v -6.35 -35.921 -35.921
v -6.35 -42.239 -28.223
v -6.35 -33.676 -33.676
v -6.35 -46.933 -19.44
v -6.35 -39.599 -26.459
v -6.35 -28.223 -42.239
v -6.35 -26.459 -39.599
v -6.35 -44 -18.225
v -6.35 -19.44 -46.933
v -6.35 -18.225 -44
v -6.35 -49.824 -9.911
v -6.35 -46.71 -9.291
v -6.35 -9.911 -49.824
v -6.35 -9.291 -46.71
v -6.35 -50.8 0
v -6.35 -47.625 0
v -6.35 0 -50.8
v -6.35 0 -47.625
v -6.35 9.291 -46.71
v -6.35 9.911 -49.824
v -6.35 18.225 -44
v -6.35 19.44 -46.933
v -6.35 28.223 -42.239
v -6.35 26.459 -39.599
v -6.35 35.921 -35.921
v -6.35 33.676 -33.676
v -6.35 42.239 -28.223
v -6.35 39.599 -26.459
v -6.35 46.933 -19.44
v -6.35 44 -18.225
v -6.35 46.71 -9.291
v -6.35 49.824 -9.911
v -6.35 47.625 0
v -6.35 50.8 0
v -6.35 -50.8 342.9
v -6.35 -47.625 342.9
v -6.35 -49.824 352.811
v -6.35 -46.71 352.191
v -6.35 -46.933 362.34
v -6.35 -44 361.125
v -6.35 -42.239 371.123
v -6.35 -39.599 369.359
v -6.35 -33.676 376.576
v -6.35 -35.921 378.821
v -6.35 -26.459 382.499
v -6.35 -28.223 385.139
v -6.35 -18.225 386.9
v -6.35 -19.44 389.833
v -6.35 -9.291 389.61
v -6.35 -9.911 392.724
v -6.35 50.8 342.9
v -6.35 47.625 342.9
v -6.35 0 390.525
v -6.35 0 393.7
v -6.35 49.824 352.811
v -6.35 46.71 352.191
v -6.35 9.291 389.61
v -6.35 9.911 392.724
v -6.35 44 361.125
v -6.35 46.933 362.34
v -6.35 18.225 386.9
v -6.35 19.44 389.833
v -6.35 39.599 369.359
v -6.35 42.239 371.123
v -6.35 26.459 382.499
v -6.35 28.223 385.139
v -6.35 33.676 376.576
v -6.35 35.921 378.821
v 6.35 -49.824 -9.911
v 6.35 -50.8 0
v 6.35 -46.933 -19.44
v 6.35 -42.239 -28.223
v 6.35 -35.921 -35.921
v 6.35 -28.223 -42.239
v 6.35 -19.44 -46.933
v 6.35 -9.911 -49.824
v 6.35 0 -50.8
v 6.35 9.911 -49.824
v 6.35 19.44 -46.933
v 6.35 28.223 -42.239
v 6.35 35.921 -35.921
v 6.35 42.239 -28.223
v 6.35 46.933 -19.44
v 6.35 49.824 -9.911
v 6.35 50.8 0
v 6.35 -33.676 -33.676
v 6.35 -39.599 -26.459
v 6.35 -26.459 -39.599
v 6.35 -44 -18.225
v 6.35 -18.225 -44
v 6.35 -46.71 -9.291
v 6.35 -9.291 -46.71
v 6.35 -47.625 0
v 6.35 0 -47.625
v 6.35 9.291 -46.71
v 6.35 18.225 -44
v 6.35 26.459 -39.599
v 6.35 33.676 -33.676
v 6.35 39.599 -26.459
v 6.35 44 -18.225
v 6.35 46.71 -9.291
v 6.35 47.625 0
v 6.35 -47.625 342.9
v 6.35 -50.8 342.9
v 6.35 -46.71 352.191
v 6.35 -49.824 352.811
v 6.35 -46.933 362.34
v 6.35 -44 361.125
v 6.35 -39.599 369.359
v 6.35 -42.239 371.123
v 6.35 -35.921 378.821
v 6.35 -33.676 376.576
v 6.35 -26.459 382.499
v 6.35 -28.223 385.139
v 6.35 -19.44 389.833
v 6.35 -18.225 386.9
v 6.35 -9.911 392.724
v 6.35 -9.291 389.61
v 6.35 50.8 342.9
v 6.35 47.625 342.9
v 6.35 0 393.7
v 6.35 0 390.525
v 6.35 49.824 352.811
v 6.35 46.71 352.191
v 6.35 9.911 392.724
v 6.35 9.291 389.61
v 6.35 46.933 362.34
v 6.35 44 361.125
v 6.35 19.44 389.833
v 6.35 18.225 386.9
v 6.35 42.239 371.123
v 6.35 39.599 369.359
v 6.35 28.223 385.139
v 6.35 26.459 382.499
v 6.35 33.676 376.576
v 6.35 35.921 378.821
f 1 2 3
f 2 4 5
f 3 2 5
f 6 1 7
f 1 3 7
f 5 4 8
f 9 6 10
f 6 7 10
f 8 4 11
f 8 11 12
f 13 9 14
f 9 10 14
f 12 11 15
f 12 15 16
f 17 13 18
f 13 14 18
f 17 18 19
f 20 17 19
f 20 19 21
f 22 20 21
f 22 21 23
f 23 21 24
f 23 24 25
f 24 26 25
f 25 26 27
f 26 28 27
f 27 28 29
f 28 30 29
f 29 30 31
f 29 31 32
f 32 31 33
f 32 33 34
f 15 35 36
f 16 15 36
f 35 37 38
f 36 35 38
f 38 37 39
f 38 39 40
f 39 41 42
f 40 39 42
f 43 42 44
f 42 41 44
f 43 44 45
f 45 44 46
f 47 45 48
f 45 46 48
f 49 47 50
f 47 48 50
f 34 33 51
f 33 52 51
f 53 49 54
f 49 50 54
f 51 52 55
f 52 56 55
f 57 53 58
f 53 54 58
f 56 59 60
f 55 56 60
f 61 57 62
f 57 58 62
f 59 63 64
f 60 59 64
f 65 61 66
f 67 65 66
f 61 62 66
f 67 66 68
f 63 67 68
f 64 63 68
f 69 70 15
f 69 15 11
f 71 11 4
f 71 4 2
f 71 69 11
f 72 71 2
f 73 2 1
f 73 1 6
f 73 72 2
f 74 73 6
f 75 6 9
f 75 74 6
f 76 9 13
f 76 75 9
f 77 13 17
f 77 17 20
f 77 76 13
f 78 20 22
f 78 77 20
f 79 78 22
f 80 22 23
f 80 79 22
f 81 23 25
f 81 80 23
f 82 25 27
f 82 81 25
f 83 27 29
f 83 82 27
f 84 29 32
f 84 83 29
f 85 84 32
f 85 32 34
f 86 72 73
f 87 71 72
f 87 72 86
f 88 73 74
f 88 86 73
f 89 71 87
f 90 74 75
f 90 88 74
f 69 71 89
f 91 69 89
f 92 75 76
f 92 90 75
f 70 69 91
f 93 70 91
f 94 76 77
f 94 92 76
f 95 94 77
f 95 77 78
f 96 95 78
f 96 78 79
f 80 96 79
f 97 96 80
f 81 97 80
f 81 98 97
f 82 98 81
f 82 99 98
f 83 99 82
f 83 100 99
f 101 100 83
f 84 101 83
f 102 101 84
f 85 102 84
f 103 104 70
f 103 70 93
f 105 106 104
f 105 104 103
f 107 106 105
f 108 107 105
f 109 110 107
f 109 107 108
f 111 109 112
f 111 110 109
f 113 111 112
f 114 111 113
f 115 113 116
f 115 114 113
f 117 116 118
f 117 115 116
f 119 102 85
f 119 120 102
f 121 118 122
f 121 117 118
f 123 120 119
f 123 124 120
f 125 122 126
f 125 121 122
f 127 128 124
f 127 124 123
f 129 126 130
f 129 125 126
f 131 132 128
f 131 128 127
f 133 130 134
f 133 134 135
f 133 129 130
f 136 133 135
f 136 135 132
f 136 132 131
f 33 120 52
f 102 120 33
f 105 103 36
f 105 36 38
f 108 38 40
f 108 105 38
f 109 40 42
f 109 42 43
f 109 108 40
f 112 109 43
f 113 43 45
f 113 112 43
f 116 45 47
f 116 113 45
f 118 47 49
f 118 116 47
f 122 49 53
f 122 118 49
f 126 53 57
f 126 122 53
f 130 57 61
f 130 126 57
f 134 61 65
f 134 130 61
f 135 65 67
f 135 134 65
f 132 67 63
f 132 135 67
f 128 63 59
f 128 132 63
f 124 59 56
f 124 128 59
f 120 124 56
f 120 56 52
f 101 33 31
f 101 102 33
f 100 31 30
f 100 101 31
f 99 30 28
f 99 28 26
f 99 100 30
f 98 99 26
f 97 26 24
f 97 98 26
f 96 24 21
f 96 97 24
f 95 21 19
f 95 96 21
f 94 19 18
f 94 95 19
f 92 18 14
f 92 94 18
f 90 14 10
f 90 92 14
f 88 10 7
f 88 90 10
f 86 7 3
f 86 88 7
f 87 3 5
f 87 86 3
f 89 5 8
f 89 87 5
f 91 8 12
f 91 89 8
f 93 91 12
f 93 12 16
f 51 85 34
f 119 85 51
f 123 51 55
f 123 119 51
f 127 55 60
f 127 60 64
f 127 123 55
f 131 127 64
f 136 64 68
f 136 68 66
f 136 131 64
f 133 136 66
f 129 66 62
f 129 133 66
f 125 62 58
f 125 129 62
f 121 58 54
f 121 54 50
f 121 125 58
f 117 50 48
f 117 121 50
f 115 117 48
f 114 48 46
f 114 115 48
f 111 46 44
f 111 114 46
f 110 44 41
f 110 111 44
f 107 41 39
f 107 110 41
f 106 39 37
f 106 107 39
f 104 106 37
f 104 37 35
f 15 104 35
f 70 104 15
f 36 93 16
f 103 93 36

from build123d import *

# Parameters (mm, degrees)
F1_DEPTH = 6.35


with BuildPart() as f1:
    # F0 (on Right) → F1 (new body, symmetric)
    with BuildSketch(Plane.YZ):
        with BuildLine():
            Line((-50.8, 342.9), (-50.8, 0))
            ThreePointArc((-50.8, 0), (0, -50.8), (50.8, 0))
            Line((50.8, 0), (50.8, 342.9))
            ThreePointArc((50.8, 342.9), (0, 393.7), (-50.8, 342.9))
        make_face()
        with BuildLine():
            ThreePointArc((-47.625, 342.9), (0, 390.525), (47.625, 342.9))
            Line((47.625, 342.9), (47.625, 0))
            ThreePointArc((47.625, 0), (0, -47.625), (-47.625, 0))
            Line((-47.625, 0), (-47.625, 342.9))
        make_face(mode=Mode.SUBTRACT)
    extrude(amount=F1_DEPTH, both=True)


solid = f1.part
